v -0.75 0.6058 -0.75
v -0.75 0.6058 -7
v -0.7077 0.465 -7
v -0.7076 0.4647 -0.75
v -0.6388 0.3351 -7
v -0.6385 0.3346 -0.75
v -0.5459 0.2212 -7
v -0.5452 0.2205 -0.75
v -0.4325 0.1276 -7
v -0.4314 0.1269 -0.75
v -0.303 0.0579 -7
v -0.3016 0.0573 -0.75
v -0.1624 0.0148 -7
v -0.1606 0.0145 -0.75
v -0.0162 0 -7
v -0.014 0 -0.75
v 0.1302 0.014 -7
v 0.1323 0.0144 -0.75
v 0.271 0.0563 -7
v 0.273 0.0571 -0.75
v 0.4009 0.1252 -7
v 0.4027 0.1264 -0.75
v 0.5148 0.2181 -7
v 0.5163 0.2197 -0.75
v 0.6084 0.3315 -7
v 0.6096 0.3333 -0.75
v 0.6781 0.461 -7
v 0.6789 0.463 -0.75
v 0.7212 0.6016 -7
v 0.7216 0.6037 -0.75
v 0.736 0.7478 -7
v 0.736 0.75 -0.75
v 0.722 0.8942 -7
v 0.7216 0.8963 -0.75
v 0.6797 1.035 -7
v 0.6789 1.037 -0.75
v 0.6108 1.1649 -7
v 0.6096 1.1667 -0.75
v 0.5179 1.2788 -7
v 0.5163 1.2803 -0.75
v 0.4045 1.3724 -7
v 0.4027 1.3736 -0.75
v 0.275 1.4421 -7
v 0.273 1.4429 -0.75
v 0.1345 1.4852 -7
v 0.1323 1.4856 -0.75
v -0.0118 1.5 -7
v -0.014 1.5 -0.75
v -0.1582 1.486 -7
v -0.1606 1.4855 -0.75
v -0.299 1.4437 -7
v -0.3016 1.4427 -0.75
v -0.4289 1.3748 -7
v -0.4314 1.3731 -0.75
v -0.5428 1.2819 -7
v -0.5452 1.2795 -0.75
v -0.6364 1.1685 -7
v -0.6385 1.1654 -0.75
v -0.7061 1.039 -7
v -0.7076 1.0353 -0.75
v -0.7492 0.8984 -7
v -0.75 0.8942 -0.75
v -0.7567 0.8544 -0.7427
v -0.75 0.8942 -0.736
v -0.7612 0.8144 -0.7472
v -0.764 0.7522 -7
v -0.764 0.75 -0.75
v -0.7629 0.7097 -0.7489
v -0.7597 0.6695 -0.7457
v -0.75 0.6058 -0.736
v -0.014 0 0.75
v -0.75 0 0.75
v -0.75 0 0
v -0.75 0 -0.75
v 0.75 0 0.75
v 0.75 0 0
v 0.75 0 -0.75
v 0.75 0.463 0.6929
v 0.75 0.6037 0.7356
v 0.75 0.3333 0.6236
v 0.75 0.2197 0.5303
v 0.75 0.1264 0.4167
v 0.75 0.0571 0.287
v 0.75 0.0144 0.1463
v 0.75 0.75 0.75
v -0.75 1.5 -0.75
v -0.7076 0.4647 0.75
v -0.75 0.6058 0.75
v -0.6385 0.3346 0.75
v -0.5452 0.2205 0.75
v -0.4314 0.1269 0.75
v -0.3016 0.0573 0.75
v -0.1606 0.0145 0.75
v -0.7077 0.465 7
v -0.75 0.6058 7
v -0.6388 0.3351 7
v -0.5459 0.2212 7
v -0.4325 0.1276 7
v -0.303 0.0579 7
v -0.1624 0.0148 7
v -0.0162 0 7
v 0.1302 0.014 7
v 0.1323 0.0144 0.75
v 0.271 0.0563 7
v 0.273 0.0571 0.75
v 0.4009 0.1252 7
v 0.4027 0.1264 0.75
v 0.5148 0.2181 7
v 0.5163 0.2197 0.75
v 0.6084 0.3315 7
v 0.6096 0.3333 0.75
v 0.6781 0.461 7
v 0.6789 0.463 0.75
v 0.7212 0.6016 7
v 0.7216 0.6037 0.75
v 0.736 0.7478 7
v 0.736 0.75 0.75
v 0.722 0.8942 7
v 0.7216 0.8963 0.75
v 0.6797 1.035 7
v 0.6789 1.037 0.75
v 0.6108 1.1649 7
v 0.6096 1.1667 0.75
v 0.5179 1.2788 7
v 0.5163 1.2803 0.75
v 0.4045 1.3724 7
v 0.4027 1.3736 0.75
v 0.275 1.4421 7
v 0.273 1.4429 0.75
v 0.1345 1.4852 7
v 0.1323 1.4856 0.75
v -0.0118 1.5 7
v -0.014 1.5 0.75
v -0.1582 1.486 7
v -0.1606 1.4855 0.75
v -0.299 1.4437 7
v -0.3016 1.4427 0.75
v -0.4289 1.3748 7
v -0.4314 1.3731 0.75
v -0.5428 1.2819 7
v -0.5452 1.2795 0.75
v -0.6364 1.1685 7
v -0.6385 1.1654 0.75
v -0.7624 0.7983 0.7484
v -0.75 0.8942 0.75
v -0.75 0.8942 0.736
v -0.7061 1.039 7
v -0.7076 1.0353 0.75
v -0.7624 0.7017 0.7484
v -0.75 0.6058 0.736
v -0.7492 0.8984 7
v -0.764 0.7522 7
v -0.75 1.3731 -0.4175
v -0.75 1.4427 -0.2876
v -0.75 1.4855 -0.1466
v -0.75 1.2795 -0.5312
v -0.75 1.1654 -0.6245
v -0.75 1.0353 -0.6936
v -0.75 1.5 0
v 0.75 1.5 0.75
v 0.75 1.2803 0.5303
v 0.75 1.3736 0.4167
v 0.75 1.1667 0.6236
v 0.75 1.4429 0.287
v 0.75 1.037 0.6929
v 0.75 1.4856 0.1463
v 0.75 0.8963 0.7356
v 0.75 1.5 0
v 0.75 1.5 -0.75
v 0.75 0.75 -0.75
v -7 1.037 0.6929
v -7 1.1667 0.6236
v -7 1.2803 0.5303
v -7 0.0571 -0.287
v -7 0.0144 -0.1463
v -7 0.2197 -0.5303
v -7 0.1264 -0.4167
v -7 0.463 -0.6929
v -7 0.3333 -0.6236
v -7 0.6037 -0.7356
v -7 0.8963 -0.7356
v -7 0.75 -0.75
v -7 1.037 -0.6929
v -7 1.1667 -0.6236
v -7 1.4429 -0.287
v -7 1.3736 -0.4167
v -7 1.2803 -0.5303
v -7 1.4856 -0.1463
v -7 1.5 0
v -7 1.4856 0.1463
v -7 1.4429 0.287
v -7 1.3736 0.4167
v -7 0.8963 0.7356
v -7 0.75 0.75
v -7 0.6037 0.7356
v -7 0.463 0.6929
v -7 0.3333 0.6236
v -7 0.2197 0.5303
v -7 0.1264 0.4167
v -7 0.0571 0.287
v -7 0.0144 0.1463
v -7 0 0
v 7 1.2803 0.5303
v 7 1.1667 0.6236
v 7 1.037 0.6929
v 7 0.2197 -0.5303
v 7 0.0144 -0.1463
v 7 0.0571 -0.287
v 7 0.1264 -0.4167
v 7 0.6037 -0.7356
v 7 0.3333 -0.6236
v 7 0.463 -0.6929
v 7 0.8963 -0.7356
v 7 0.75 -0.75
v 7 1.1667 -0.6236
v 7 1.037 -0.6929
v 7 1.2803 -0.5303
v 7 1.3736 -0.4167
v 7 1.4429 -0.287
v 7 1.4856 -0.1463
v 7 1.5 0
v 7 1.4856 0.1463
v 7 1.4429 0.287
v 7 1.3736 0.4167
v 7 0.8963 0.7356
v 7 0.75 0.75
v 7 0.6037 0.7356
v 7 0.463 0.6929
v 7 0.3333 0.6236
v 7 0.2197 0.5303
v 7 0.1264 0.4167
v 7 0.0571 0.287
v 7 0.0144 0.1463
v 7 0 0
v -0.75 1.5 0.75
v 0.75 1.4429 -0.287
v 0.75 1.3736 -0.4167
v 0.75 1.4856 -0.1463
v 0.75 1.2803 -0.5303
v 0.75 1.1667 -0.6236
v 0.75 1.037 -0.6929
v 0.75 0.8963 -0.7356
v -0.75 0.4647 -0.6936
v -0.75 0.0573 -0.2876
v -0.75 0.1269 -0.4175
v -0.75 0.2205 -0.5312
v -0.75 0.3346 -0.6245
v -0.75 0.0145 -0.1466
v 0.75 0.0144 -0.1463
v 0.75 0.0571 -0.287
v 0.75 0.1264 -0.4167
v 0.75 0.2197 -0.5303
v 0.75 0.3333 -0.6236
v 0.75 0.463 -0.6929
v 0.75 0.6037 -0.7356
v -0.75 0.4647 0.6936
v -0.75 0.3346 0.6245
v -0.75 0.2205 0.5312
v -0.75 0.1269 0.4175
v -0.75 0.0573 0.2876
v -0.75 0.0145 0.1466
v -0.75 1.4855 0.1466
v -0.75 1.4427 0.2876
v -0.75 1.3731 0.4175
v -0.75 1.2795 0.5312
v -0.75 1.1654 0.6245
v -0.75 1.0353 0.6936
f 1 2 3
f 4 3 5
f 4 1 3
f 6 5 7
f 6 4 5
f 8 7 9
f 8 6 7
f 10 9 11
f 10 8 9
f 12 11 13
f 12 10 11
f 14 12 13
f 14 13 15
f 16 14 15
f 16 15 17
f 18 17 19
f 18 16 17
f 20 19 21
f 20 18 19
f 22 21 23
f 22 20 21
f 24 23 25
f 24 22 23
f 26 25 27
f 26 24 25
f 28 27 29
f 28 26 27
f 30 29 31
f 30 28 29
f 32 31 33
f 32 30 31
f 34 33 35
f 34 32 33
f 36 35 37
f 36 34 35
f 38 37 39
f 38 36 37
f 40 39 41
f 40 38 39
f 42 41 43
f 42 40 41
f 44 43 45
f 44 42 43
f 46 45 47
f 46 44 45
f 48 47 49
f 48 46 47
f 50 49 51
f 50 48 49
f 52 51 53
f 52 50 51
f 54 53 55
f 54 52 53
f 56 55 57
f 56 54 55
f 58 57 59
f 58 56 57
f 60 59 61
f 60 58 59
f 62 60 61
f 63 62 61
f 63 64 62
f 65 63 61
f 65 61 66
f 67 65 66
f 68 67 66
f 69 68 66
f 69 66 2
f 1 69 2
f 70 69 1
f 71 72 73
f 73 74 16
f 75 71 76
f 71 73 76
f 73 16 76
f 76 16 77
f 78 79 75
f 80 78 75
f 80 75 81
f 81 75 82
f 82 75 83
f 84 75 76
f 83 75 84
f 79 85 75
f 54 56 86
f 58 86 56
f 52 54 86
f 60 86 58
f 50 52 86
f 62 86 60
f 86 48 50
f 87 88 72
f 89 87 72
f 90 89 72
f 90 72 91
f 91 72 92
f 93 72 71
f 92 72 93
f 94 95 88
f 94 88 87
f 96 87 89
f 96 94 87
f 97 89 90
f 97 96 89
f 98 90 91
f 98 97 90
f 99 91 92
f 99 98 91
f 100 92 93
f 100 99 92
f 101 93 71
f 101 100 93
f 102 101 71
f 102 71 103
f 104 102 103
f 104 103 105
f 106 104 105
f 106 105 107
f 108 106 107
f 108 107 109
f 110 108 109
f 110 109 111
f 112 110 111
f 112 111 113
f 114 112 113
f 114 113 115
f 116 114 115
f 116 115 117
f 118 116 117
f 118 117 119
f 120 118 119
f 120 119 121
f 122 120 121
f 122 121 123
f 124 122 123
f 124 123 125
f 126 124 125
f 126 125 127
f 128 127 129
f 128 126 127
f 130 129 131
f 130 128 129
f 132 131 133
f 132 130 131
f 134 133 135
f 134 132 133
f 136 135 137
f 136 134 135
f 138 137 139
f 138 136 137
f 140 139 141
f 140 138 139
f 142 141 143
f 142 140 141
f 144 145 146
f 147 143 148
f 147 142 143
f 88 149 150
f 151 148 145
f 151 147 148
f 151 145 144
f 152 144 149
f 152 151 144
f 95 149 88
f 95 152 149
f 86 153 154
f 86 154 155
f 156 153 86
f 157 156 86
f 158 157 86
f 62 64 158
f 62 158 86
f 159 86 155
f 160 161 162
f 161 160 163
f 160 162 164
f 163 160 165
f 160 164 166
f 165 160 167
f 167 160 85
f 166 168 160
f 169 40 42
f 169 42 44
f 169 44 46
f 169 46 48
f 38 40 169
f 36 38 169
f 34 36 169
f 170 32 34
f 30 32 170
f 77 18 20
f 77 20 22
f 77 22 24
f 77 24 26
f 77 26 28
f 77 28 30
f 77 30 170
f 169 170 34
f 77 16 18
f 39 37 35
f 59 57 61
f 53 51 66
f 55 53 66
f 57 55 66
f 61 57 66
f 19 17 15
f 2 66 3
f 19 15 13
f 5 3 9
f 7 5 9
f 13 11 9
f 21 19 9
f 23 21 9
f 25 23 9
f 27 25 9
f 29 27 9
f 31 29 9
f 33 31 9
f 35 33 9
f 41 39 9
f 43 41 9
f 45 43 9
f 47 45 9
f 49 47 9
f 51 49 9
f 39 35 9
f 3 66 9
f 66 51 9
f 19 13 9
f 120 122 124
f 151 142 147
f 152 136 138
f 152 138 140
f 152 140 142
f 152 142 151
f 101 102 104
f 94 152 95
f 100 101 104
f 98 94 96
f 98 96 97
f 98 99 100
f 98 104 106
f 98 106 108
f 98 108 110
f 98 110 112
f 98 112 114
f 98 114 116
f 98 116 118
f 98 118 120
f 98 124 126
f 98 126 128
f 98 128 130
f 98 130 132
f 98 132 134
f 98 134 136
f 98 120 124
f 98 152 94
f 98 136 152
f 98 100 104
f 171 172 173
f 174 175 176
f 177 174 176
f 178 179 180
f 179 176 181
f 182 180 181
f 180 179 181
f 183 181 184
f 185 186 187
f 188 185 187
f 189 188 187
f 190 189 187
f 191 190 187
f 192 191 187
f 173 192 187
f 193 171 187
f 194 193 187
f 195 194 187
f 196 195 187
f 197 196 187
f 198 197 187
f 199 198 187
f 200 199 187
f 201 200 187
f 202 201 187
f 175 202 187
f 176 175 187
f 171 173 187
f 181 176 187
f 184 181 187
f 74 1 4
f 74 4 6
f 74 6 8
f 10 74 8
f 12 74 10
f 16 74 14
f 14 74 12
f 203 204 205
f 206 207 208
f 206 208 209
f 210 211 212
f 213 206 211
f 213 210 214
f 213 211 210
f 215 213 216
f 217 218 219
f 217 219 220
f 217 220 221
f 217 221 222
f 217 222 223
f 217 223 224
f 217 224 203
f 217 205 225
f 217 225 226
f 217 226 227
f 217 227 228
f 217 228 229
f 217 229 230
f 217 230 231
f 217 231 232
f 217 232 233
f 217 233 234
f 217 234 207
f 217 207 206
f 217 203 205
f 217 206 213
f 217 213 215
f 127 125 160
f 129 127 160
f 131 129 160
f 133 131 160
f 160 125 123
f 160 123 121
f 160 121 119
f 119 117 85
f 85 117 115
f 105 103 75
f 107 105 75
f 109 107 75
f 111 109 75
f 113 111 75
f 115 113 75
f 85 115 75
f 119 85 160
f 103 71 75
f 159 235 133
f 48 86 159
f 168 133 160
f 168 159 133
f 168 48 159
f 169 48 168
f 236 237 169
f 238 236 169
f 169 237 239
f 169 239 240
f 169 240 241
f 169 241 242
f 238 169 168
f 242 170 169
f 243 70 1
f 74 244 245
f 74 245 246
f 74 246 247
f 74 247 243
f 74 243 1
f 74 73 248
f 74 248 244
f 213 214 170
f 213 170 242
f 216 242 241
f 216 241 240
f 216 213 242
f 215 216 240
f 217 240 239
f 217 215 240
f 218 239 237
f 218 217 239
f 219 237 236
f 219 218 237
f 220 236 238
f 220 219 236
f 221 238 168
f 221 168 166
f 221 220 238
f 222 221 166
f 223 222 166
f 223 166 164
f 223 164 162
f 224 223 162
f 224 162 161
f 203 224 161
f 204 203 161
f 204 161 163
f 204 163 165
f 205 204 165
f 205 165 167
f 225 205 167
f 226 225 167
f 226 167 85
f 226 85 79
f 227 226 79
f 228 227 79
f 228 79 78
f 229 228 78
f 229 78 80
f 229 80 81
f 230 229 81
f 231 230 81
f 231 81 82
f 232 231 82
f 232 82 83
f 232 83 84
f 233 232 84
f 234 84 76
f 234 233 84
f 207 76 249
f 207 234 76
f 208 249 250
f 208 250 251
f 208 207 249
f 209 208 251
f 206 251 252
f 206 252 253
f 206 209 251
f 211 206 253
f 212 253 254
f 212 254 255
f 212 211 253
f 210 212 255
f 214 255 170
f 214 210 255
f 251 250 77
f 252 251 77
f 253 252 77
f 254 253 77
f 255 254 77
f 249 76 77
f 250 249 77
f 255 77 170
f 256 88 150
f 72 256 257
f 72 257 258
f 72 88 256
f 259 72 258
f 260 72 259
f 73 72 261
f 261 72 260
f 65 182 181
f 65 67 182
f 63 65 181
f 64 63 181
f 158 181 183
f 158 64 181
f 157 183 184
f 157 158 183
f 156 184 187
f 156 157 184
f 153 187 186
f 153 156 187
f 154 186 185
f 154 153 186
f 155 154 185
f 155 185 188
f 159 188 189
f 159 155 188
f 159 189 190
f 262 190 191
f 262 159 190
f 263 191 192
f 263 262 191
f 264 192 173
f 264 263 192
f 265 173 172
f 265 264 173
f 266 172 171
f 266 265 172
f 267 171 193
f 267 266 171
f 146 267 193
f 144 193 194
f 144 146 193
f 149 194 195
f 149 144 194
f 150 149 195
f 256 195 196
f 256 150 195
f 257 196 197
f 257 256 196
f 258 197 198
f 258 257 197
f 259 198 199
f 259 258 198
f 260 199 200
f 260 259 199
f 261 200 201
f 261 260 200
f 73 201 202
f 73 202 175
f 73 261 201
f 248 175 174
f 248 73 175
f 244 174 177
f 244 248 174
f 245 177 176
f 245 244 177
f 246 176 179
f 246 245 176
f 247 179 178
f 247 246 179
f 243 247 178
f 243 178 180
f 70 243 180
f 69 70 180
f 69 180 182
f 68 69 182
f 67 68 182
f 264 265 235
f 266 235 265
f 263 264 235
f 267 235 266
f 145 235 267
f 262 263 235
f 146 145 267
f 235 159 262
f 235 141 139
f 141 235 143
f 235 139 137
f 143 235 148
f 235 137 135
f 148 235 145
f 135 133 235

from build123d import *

# Parameters (mm, degrees)
SKETCH1_W           = 1.5
SKETCH1_H           = 1.5
BOSS_EXTRUDE1_DEPTH = 1.5
SKETCH3_R           = 0.75
BOSS_EXTRUDE2_DEPTH = 7
SKETCH4_R           = 0.75
BOSS_EXTRUDE3_DEPTH = 7


with BuildPart() as part:
    # Sketch1 → Boss-Extrude1 (new body)
    with BuildSketch(Plane(origin=(0, 0, 0), x_dir=(1, 0, 0), z_dir=(0, 1, 0))):
        Rectangle(SKETCH1_W, SKETCH1_H)
    extrude(amount=BOSS_EXTRUDE1_DEPTH)

    # Sketch3 → Boss-Extrude2 (add, symmetric)
    with BuildSketch(Plane(origin=(0, 0, 0), x_dir=(0, 0, -1), z_dir=(1, 0, 0))):
        with Locations((0, 0.75)):
            Circle(SKETCH3_R)
    extrude(amount=BOSS_EXTRUDE2_DEPTH, both=True)

    # Sketch4 → Boss-Extrude3 (add, symmetric)
    with BuildSketch(Plane.XY):
        with Locations(Location((-0.013990229, 0.75, 0), (0, 0, 191.084007893))):
            Circle(SKETCH4_R)
    extrude(amount=BOSS_EXTRUDE3_DEPTH, both=True)


solid = part.part
